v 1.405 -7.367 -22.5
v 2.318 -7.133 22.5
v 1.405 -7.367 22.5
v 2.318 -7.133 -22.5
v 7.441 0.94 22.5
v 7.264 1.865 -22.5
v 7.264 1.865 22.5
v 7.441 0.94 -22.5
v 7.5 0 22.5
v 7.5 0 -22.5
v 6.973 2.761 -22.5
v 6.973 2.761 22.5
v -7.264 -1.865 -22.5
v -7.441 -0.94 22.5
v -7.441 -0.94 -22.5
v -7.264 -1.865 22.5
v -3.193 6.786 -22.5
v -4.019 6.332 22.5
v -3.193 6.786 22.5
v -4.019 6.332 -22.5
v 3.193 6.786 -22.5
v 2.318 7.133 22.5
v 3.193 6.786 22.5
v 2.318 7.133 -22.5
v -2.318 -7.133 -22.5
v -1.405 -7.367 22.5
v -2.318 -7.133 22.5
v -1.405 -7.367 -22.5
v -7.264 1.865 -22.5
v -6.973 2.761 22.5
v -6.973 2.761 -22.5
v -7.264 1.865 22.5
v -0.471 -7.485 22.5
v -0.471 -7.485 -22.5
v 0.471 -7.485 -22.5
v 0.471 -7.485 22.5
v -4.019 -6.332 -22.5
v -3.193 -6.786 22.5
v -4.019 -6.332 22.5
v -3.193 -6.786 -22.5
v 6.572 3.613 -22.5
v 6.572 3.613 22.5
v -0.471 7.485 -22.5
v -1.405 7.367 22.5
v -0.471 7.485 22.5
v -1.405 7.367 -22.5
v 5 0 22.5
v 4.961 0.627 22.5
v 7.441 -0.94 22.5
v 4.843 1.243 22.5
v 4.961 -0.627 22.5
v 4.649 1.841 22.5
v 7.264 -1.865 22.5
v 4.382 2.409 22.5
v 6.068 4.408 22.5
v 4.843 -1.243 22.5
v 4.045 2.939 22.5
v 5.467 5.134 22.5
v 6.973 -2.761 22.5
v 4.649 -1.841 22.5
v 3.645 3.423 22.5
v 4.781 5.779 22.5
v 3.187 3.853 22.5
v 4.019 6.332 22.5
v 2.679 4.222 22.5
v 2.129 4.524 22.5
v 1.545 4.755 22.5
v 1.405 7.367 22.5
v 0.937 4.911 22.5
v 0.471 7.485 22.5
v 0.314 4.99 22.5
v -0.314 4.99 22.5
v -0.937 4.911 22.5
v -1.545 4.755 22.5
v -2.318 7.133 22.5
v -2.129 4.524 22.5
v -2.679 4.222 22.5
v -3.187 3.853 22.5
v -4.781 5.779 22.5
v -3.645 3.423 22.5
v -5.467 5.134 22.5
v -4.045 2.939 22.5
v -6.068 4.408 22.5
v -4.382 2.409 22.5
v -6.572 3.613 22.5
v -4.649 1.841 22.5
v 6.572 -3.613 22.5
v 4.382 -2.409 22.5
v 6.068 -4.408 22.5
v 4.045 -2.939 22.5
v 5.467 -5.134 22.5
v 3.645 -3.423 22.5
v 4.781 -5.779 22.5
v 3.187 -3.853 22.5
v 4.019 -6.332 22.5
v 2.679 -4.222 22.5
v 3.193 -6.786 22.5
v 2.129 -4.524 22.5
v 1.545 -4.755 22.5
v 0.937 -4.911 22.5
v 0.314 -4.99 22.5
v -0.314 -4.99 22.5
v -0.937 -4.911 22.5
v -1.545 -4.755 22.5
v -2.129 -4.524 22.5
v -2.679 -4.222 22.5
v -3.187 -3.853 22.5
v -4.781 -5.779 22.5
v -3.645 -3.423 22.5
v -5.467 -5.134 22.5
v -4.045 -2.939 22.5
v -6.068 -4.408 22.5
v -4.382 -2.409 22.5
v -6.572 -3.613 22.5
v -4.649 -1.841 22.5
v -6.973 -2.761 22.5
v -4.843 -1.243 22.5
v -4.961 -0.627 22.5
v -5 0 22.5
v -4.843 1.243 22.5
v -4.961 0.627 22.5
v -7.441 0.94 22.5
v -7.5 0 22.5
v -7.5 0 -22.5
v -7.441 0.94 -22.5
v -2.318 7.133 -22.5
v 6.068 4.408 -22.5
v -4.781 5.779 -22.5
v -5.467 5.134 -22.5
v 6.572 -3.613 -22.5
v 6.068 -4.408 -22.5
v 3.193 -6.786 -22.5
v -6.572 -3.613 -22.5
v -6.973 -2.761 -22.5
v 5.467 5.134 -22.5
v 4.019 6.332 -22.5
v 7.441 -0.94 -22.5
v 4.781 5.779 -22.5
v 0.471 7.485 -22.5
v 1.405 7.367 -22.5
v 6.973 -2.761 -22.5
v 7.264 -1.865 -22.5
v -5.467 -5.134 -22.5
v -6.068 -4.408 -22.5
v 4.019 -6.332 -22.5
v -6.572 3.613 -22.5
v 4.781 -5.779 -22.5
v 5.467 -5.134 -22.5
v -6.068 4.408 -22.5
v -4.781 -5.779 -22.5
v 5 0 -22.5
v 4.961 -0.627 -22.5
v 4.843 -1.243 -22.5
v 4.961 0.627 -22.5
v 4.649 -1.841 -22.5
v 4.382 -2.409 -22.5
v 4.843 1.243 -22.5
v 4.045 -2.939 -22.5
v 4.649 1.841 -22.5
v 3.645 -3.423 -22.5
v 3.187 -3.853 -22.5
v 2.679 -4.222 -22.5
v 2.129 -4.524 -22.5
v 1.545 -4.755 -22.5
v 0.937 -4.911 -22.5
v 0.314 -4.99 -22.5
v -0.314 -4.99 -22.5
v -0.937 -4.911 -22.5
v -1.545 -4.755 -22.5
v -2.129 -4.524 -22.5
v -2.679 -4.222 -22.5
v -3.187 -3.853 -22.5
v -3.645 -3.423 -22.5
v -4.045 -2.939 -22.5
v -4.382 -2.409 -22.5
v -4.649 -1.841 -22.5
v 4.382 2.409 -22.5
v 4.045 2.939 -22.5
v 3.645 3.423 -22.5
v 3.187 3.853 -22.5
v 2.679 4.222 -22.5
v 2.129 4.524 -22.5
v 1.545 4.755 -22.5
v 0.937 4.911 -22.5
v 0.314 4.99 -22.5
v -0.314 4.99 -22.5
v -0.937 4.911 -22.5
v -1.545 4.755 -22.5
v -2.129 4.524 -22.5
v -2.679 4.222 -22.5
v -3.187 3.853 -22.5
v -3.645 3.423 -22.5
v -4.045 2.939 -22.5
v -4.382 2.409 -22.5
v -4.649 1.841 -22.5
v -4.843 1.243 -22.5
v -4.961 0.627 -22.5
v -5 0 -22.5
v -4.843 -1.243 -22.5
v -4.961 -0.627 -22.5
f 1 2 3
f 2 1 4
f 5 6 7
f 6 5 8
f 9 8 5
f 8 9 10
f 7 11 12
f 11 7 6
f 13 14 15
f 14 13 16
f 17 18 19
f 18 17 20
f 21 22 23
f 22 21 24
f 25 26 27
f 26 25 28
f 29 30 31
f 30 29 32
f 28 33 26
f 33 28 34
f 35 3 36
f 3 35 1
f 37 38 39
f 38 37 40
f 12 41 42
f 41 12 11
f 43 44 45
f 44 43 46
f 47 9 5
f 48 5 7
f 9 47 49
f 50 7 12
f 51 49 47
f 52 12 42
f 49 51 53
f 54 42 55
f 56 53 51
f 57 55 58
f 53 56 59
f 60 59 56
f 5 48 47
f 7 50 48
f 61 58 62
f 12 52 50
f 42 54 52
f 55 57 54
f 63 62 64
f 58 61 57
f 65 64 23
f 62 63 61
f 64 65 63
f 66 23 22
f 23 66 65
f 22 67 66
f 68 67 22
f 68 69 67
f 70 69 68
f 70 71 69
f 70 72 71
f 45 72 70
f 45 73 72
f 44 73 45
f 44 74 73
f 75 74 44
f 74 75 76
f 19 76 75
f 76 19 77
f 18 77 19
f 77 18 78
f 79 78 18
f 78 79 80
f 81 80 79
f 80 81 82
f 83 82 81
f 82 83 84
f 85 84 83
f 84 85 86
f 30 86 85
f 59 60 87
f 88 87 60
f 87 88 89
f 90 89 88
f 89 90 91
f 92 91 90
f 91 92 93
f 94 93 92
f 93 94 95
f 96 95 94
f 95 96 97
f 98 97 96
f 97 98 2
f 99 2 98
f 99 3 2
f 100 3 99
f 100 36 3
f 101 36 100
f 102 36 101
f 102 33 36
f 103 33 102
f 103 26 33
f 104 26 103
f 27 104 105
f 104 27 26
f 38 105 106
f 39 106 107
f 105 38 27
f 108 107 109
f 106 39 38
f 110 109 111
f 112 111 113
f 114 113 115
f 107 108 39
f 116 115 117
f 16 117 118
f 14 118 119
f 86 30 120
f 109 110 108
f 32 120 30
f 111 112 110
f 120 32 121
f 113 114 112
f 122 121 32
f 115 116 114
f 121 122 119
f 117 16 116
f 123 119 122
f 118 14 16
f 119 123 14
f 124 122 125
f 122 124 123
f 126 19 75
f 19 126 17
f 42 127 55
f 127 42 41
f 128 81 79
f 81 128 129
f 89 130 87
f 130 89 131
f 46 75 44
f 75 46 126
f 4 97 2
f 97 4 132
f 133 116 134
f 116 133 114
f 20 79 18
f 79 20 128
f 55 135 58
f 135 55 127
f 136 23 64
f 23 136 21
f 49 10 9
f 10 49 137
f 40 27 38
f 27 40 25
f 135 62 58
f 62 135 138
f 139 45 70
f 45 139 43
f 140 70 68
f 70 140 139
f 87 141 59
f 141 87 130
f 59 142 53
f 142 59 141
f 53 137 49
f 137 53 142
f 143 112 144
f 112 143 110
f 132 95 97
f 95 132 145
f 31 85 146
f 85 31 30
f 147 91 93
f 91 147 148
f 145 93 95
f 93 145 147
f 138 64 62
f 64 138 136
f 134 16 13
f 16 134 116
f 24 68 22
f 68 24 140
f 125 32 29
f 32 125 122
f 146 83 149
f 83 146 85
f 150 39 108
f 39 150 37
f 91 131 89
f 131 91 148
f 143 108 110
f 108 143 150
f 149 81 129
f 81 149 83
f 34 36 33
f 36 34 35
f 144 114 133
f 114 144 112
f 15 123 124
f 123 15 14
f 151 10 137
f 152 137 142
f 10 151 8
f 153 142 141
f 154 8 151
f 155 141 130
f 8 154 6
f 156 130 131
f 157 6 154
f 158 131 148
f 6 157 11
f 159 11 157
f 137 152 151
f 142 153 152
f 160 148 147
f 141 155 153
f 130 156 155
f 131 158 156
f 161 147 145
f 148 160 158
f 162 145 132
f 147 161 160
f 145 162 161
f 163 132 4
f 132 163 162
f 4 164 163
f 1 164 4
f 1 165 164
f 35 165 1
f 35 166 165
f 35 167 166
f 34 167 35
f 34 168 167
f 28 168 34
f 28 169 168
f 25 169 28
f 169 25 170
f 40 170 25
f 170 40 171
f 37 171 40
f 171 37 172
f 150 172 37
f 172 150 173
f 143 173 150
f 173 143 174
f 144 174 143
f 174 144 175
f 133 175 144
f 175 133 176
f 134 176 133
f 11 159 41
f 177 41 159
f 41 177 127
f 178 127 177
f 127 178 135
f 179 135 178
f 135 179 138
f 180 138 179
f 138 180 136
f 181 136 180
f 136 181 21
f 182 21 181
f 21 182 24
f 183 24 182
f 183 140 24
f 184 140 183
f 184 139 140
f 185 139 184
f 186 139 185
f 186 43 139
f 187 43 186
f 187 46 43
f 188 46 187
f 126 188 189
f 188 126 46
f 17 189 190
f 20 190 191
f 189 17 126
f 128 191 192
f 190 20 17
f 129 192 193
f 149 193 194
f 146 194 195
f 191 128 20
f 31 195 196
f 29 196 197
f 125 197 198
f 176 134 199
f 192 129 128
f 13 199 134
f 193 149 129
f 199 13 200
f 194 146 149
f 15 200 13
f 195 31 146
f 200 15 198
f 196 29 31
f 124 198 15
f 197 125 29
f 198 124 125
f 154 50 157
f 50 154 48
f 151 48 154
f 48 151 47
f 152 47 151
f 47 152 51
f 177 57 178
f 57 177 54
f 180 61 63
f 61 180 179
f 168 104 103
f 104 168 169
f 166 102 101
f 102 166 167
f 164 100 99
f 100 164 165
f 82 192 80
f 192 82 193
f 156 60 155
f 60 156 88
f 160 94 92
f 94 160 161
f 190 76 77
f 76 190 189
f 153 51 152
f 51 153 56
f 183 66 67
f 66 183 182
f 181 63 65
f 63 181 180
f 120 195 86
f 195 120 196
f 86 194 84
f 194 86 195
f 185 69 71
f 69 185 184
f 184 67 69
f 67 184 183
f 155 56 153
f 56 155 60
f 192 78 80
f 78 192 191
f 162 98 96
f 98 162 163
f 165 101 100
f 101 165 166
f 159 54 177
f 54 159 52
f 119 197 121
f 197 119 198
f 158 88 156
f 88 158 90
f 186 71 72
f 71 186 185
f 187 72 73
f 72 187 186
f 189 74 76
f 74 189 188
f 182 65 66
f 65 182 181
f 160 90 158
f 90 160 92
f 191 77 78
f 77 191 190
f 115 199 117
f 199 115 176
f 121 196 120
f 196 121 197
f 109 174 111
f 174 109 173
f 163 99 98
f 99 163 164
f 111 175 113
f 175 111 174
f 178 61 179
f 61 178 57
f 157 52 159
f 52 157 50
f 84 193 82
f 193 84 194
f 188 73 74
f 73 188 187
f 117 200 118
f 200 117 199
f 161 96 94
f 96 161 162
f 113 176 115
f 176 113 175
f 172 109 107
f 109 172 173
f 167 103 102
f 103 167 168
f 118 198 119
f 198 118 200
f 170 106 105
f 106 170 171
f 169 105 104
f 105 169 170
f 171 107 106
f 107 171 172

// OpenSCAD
$fn = 50;


difference() {
	union() {
		translate(v = [0, 0, -22.5000000000]) {
			cylinder(h = 45, r = 7.5000000000);
		}
	}
	union() {
		translate(v = [0, 0, -100.0000000000]) {
			cylinder(h = 200, r = 5.0000000000);
		}
	}
}
